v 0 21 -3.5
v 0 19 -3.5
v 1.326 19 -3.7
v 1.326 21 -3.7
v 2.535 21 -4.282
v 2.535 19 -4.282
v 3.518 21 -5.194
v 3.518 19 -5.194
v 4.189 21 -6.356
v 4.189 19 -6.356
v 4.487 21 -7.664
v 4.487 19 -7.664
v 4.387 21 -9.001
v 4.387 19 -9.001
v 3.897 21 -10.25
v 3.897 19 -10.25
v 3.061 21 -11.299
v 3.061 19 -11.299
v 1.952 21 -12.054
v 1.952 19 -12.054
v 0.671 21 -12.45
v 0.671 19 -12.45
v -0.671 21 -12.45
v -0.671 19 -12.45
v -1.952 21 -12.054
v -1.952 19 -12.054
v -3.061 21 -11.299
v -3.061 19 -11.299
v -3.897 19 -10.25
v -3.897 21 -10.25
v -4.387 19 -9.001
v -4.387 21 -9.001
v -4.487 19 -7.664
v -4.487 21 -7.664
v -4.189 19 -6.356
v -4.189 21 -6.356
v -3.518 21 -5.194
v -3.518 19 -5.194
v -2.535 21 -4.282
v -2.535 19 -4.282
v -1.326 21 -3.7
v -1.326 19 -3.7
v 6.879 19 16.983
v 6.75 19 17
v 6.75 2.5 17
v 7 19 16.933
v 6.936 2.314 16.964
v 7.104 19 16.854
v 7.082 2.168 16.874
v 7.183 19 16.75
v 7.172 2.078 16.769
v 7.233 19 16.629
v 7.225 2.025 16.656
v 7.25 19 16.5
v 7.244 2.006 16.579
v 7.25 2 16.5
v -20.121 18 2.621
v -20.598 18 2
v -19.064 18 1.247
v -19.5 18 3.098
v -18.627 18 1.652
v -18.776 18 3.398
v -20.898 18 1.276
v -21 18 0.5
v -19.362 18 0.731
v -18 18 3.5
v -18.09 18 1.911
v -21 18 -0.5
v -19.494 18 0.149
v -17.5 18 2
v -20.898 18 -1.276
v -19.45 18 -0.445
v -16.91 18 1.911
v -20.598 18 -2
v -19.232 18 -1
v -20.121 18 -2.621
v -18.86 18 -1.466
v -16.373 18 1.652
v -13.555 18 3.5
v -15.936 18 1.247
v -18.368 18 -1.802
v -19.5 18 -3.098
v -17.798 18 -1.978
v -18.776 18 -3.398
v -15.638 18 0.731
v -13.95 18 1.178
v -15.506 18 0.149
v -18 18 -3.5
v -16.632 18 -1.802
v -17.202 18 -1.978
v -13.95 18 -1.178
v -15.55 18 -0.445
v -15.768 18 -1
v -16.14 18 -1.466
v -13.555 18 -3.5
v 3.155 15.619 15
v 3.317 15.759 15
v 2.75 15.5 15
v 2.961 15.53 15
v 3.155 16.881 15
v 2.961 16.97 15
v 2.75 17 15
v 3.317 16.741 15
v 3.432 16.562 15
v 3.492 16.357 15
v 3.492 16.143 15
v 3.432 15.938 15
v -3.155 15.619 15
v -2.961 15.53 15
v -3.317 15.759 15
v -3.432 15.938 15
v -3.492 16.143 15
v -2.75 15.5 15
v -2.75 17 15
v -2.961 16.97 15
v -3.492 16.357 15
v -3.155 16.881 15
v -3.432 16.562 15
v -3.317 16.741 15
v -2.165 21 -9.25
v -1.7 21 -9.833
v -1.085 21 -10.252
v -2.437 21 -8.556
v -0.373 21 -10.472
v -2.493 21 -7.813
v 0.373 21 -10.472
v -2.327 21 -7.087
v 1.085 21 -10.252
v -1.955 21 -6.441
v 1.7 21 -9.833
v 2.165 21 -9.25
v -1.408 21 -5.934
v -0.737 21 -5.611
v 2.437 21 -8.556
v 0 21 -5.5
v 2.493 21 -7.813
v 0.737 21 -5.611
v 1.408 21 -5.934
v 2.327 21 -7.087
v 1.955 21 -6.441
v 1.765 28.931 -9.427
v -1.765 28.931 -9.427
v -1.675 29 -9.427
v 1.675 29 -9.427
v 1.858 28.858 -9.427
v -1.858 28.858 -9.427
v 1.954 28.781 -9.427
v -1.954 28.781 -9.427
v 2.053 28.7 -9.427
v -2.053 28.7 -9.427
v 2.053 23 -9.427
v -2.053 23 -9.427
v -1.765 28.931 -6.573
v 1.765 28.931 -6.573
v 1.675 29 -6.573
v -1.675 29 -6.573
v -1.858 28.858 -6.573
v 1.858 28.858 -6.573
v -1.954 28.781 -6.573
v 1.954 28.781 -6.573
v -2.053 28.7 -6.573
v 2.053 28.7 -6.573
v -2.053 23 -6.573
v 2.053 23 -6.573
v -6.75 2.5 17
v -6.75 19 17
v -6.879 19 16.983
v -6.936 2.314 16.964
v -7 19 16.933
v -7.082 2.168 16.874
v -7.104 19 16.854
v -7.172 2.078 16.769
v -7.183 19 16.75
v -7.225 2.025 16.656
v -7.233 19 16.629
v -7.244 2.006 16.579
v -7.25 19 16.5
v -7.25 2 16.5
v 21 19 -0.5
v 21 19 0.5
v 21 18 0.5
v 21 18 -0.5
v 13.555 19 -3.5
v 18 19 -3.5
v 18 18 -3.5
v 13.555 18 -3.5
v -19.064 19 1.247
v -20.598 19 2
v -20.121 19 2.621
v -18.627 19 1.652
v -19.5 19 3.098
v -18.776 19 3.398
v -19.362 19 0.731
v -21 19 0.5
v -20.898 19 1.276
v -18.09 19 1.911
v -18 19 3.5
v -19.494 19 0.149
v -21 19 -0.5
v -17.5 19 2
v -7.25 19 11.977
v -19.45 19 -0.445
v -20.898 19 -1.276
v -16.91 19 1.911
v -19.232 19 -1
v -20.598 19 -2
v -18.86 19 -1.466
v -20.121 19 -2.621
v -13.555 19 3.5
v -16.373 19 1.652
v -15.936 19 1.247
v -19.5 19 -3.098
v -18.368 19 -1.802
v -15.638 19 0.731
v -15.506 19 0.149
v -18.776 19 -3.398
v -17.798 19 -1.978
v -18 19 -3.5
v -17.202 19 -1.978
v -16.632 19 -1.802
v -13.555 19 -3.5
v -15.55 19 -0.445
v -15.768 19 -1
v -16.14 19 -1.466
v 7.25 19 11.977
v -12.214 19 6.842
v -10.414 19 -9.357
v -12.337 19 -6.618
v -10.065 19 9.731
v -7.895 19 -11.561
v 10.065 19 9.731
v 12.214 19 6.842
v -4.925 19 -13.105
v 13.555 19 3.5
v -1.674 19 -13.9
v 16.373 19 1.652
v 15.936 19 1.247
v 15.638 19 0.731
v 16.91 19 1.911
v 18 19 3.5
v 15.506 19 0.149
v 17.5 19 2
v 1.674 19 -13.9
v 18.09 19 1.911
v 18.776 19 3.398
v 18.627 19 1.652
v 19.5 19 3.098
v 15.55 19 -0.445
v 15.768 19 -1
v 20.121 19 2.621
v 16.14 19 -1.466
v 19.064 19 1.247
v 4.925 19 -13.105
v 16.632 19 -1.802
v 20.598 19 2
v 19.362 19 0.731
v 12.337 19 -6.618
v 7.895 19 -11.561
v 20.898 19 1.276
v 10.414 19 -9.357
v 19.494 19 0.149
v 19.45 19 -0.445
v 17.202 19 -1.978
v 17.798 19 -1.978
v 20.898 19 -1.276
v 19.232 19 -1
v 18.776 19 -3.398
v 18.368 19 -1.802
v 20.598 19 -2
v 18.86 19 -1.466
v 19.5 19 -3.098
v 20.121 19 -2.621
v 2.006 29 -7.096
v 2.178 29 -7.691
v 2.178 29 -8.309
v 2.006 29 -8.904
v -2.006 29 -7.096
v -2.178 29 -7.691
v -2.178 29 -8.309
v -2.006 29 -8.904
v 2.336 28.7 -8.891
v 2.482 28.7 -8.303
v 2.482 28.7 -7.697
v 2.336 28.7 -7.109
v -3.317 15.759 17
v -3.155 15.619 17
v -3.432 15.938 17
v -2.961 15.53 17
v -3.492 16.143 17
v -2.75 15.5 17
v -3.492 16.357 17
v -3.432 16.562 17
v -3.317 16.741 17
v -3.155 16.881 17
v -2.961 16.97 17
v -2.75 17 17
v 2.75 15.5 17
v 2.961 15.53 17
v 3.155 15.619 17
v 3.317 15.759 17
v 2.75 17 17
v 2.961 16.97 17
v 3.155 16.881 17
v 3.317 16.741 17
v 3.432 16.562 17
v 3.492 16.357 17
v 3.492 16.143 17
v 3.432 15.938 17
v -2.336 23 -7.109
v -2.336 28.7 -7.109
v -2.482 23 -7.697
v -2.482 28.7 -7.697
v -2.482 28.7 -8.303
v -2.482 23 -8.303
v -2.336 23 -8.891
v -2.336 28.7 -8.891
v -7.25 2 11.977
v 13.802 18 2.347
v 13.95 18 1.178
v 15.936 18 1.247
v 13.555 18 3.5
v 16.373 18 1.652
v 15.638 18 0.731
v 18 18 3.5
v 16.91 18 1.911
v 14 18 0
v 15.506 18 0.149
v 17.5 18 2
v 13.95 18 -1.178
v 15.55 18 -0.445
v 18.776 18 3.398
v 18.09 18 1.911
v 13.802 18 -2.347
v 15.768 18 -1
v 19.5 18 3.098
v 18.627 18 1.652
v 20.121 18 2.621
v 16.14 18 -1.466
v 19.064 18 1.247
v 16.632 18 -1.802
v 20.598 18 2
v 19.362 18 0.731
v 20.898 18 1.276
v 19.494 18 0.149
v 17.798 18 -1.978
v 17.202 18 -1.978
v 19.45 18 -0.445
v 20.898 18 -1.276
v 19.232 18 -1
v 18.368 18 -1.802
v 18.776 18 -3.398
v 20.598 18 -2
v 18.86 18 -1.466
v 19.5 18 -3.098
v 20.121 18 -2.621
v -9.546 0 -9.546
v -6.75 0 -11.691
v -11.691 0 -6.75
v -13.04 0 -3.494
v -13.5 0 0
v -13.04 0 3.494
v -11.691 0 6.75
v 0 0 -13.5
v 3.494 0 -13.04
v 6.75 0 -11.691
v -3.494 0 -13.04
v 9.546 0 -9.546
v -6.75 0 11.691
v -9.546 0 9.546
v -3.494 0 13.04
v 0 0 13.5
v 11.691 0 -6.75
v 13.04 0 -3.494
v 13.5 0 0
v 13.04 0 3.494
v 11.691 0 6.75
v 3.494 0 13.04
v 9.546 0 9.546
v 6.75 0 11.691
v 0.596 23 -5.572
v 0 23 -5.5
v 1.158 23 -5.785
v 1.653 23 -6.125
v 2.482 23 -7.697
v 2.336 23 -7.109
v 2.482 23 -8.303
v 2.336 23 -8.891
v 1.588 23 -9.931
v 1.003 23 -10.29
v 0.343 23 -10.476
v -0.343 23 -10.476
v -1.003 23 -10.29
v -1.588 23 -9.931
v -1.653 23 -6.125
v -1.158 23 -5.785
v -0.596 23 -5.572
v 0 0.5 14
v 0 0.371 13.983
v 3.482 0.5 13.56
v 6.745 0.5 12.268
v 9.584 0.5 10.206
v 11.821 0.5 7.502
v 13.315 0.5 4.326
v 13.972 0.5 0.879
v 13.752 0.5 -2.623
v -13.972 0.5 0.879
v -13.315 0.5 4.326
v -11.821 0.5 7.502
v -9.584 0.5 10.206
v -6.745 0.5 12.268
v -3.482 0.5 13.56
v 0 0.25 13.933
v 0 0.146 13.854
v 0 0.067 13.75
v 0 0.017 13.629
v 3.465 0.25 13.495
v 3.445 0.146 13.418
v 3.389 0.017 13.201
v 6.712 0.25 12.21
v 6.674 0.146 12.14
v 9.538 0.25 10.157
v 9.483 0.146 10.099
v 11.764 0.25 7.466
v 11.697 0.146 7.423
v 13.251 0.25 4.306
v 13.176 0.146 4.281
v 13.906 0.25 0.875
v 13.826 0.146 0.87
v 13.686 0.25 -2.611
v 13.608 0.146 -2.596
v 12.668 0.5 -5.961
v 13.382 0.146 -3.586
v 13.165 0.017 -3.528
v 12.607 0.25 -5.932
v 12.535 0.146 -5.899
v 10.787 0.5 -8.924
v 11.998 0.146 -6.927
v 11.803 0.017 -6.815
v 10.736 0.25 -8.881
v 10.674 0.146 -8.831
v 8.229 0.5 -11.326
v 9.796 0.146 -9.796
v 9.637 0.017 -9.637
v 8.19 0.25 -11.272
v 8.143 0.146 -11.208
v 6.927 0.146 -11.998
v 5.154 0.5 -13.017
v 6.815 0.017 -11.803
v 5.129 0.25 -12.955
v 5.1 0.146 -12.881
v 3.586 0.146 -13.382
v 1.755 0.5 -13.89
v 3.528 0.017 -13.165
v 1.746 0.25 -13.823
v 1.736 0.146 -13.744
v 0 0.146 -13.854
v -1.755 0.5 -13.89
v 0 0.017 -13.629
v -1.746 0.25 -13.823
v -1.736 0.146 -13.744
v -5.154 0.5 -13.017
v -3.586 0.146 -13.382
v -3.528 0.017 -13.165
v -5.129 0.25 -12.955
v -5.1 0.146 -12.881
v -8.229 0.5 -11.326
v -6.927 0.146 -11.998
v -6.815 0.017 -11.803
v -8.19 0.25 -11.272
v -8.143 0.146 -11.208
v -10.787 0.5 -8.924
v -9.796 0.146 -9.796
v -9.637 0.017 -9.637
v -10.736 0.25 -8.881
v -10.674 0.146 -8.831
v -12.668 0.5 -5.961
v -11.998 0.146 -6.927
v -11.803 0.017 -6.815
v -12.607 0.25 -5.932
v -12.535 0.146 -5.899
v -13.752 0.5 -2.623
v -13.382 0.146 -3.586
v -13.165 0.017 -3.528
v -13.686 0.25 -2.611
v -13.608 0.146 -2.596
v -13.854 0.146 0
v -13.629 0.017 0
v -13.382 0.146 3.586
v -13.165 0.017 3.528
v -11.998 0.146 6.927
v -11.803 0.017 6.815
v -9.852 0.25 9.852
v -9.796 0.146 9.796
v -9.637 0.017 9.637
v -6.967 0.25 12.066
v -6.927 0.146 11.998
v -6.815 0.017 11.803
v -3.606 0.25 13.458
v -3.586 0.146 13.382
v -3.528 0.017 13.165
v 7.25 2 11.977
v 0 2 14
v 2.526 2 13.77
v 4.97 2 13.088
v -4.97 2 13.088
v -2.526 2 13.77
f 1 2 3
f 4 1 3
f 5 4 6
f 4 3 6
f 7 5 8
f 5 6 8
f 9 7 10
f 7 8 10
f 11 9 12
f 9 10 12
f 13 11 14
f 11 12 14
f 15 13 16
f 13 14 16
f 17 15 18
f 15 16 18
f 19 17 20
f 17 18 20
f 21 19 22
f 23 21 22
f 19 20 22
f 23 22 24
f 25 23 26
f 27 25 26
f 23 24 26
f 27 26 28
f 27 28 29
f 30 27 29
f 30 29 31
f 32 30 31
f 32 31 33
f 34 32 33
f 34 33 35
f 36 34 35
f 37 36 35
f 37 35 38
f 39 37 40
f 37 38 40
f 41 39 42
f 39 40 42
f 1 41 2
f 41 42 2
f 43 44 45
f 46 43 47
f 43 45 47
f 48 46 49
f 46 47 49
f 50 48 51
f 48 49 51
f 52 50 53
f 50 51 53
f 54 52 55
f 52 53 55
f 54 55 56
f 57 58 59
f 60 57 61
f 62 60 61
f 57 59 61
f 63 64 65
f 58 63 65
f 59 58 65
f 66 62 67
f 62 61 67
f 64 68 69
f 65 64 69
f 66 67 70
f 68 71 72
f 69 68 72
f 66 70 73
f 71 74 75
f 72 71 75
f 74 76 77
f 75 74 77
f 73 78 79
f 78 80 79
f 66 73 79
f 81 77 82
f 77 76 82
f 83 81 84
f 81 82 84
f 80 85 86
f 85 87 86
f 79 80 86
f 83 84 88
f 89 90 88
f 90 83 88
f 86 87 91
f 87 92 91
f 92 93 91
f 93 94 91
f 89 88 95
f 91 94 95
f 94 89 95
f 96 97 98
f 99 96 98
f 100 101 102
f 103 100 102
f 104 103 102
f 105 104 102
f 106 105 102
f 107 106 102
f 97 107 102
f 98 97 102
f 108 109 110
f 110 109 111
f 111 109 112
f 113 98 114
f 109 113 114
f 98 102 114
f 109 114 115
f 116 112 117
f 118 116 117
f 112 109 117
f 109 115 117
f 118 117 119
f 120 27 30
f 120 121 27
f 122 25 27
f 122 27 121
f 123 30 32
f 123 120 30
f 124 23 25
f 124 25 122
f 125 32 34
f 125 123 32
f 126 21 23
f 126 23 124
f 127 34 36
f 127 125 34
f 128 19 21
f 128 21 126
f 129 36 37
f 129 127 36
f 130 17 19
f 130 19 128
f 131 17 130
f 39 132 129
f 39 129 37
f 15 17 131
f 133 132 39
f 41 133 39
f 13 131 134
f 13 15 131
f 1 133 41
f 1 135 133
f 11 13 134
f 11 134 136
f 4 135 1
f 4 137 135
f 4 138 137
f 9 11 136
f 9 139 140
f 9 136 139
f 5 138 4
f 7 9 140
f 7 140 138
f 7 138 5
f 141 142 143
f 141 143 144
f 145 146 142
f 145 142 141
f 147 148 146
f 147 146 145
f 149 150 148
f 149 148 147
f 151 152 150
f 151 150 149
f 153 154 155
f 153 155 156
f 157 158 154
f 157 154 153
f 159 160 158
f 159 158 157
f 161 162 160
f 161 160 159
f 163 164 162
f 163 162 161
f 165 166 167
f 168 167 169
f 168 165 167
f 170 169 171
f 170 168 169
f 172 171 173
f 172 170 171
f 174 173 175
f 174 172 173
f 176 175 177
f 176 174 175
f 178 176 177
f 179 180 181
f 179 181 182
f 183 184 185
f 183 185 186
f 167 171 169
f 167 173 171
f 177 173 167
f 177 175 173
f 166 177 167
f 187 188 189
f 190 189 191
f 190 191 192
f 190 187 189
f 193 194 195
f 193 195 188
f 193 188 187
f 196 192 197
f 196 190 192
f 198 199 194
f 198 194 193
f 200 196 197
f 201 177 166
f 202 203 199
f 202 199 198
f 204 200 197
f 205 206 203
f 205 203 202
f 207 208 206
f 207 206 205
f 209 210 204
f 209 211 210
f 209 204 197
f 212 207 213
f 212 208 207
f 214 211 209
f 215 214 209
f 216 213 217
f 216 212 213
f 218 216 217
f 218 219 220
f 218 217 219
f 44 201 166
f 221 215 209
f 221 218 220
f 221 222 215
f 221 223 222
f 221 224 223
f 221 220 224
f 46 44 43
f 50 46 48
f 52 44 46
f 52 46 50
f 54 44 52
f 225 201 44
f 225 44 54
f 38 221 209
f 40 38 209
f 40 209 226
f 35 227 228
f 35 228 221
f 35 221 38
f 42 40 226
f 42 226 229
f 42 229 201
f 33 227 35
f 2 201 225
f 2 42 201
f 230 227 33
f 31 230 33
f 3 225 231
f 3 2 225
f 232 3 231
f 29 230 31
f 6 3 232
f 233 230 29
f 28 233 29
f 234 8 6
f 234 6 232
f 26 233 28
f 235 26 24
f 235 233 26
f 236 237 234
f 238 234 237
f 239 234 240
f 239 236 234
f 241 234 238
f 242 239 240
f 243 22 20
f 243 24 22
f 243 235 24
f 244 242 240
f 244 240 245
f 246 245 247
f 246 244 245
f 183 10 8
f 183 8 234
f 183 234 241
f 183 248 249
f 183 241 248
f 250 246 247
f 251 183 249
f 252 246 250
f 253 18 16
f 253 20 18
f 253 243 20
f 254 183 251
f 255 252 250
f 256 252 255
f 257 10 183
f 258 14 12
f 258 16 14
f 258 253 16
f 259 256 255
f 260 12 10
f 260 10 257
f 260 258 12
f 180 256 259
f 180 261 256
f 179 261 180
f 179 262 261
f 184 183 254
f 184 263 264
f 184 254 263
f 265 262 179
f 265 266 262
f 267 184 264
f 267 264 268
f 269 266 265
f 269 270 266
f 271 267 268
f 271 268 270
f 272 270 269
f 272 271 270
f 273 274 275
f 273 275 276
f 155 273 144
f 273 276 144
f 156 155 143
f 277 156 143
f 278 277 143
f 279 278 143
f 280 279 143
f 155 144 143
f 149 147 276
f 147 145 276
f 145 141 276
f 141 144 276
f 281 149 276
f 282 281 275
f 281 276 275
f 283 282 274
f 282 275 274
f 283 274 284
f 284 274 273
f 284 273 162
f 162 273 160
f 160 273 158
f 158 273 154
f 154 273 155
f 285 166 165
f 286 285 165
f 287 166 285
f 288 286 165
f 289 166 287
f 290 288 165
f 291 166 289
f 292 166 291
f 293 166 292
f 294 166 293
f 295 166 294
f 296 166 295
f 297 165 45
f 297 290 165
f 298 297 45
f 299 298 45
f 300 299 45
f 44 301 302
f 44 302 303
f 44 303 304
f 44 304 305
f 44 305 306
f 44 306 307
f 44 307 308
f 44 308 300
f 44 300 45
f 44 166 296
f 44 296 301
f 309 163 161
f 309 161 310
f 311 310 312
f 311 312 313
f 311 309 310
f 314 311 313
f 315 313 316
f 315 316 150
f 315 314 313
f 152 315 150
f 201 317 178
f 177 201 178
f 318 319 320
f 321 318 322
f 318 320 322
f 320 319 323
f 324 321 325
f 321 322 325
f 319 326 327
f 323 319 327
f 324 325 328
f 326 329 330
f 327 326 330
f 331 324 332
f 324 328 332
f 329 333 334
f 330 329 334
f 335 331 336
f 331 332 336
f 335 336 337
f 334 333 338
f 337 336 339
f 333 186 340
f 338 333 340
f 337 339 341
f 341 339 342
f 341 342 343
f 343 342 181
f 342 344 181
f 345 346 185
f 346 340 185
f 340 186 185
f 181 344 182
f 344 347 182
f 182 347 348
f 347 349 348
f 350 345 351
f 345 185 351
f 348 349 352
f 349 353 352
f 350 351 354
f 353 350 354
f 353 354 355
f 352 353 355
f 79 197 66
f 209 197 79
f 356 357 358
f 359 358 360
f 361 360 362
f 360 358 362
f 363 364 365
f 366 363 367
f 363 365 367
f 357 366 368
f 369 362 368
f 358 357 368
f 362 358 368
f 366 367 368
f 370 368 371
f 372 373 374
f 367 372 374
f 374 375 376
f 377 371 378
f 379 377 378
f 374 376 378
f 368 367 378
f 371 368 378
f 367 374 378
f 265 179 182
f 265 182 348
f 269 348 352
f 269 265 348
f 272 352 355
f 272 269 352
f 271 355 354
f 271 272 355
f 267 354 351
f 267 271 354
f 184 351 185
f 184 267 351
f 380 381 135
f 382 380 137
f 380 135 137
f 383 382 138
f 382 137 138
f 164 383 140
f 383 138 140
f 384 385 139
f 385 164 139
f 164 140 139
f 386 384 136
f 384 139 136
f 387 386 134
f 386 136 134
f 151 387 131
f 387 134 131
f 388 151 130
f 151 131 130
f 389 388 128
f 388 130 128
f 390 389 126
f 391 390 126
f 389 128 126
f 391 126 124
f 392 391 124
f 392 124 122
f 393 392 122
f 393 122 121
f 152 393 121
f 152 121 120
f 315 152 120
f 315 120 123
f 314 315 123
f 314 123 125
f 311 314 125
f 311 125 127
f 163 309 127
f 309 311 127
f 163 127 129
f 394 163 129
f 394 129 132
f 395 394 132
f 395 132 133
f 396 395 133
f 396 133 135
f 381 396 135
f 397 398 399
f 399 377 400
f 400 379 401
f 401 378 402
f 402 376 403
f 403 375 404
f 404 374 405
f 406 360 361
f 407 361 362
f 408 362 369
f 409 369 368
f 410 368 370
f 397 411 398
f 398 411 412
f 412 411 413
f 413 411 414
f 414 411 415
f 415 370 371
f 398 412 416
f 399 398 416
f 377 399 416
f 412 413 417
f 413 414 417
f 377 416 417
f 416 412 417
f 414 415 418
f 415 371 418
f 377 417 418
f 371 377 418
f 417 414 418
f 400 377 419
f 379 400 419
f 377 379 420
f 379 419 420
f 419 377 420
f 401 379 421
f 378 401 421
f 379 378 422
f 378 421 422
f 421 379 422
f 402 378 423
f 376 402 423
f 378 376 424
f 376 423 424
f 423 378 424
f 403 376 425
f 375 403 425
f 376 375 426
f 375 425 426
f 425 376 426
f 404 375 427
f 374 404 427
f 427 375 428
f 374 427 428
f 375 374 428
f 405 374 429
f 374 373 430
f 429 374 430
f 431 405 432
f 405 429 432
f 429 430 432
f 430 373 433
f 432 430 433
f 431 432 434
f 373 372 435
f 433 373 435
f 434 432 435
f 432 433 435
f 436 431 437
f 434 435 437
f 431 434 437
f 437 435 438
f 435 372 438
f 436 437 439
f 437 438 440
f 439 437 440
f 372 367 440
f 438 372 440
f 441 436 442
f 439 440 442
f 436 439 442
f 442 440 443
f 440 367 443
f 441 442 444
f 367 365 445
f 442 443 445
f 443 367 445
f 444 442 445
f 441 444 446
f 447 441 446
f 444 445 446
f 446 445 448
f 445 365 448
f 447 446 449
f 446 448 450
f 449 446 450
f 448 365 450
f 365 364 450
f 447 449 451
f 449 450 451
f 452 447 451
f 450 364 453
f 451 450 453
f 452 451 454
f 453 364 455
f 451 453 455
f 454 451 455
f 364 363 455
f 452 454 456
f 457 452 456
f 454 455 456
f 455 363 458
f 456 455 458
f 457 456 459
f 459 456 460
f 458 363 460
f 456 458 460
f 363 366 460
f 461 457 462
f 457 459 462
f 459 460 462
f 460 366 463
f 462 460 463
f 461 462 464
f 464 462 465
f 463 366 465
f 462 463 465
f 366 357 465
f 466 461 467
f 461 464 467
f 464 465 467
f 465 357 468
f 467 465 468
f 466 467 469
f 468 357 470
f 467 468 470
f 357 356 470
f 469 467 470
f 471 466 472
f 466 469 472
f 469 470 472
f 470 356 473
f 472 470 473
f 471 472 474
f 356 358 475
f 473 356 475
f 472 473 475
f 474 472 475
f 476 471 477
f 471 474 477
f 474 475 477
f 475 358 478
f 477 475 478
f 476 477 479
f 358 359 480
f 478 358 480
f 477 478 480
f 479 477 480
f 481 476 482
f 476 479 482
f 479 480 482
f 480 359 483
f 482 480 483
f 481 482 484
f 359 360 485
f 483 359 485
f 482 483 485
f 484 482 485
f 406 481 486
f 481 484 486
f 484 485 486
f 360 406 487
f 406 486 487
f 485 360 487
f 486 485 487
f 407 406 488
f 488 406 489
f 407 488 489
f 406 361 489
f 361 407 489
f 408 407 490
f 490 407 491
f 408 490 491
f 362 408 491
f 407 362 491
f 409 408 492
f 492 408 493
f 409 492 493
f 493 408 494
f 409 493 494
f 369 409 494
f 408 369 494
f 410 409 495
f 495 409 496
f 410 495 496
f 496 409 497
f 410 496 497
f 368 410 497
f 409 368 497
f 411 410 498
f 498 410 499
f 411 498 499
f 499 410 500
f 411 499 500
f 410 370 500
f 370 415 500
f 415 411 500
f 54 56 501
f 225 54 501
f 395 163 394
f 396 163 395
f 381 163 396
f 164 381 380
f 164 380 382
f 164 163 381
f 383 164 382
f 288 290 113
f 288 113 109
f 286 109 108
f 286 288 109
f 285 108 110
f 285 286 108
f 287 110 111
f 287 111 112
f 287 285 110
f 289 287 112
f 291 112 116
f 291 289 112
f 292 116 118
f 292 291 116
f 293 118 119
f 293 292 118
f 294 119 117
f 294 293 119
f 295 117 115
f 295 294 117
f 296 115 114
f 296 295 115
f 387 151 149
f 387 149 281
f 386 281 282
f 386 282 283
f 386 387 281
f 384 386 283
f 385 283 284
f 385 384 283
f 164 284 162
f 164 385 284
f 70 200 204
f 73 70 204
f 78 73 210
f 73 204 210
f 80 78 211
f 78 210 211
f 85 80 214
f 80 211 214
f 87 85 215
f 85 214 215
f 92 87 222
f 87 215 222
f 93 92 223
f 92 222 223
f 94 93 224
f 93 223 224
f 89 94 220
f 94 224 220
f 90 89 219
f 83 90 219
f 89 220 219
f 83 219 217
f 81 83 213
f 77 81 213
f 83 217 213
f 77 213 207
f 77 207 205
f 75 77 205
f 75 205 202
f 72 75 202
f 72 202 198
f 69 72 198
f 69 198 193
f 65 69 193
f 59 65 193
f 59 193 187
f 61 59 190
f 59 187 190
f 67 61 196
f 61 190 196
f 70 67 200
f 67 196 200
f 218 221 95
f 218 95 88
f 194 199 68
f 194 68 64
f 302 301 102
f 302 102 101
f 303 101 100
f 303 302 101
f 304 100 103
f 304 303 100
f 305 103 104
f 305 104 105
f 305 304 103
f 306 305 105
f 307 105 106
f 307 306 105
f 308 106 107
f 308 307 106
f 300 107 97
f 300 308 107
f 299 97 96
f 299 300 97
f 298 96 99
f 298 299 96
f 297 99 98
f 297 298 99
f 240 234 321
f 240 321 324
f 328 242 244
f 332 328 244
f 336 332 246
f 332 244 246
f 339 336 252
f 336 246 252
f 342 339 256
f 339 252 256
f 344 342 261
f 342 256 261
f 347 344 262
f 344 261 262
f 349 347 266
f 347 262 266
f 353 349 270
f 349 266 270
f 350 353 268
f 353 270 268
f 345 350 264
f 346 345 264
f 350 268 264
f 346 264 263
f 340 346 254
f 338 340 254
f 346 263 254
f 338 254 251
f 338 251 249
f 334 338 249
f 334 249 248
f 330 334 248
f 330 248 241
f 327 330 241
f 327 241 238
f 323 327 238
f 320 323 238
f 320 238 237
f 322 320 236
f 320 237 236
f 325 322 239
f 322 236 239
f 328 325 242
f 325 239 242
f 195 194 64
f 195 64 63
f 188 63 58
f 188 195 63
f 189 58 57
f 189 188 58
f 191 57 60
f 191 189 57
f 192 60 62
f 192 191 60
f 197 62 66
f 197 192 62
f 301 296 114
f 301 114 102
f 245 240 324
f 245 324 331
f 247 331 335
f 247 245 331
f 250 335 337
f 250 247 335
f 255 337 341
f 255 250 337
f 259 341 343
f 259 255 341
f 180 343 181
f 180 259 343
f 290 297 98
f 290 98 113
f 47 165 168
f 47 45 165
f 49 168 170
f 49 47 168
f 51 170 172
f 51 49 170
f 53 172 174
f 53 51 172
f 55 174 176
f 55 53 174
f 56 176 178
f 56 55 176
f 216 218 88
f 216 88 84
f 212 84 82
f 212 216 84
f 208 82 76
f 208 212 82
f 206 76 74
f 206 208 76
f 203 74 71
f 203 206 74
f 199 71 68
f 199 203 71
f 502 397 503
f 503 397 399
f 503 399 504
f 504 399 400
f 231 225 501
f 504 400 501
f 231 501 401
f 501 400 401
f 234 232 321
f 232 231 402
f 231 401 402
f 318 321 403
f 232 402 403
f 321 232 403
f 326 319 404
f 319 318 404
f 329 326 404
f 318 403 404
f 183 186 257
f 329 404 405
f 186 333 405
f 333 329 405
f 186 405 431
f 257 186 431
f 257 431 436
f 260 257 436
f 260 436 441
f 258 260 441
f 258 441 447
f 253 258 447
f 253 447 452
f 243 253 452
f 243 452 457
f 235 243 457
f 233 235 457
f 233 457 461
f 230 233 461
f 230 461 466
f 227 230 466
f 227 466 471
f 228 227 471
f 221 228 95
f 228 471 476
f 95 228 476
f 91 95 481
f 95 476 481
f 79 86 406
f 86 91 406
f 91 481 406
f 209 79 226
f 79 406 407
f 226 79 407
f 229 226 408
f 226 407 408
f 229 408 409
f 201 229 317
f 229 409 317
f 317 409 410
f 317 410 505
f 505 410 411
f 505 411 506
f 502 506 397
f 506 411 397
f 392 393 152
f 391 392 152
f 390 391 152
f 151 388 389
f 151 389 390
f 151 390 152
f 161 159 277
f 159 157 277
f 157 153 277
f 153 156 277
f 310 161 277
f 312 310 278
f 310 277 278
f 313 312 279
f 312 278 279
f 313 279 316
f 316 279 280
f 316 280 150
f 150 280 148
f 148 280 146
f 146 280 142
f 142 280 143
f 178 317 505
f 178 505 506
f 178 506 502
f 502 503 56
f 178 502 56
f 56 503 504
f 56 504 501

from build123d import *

# Parameters (mm, degrees)
SKETCH_1_R          = 14
EXTRUDE_1_DEPTH     = 19
SKETCH_2_R          = 2
EXTRUDE_2_DEPTH     = 1
EXTRUDE_3_DEPTH     = 17
SKETCH_6_R          = 4.5
EXTRUDE_4_DEPTH     = 2
SKETCH_7_R          = 2.5
EXTRUDE_6_DEPTH     = 2
EXTRUDE_8_DEPTH     = 6
CUT_EXTRUDE_1_DEPTH = 2
CHAMFER_4_SIZE      = 0.3
FILLET_3_R          = 0.5
FILLET_4_R          = 0.5


with BuildPart() as part:
    # Эскиз1 → Бобышка-Вытянуть1 (new body)
    with BuildSketch(Plane(origin=(0, 0, 0), x_dir=(1, 0, 0), z_dir=(0, 1, 0))):
        with Locations(Location((0, 0, 0), (0, 0, 270))):
            Circle(SKETCH_1_R)
    extrude(amount=EXTRUDE_1_DEPTH)

    # Эскиз2 → Бобышка-Вытянуть2 (add)
    with BuildSketch(Plane(origin=(0, 19, 0), x_dir=(1, 0, 0), z_dir=(0, 1, 0))):
        with BuildLine():
            ThreePointArc((14, 0), (13.888415748, -1.764060095), (13.555441712, -3.5))
            Line((13.555441712, -3.5), (18, -3.5))
            ThreePointArc((18, -3.5), (20.121320344, -2.621320344), (21, -0.5))
            Line((21, -0.5), (21, 0.5))
            ThreePointArc((21, 0.5), (20.121320344, 2.621320344), (18, 3.5))
            Line((18, 3.5), (13.555441712, 3.5))
            ThreePointArc((13.555441712, 3.5), (13.888415748, 1.764060095), (14, 0))
        make_face()
        with Locations(Location((17.5, 0, 0), (0, 0, 270))):
            Circle(SKETCH_2_R, mode=Mode.SUBTRACT)
        with BuildLine():
            ThreePointArc((-21, -0.5), (-20.121320344, -2.621320344), (-18, -3.5))
            Line((-18, -3.5), (-13.555441712, -3.5))
            ThreePointArc((-13.555441712, -3.5), (-14, 0), (-13.555441712, 3.5))
            Line((-13.555441712, 3.5), (-18, 3.5))
            ThreePointArc((-18, 3.5), (-20.121320344, 2.621320344), (-21, 0.5))
            Line((-21, 0.5), (-21, -0.5))
        make_face()
        with Locations(Location((-17.5, 0, 0), (0, 0, 270))):
            Circle(SKETCH_2_R, mode=Mode.SUBTRACT)
    extrude(amount=-EXTRUDE_2_DEPTH)

    # Эскиз5 → Бобышка-Вытянуть3 (add)
    with BuildSketch(Plane(origin=(0, 19, 0), x_dir=(1, 0, 0), z_dir=(0, 1, 0))):
        with BuildLine():
            Line((-7.25, -17), (7.25, -17))
            Line((7.25, -17), (7.25, -11.976539567))
            ThreePointArc((7.25, -11.976539567), (0, -14), (-7.25, -11.976539567))
            Line((-7.25, -11.976539567), (-7.25, -17))
        make_face()
    extrude(amount=-EXTRUDE_3_DEPTH)

    # Эскиз6 → Бобышка-Вытянуть4 (add)
    with BuildSketch(Plane(origin=(0, 19, 0), x_dir=(1, 0, 0), z_dir=(0, 1, 0))):
        with Locations(Location((0, 8, 0), (0, 0, 270))):
            Circle(SKETCH_6_R)
    extrude(amount=EXTRUDE_4_DEPTH)

    # Эскиз7 → Бобышка-Вытянуть6 (add)
    with BuildSketch(Plane(origin=(0, 21, 0), x_dir=(1, 0, 0), z_dir=(0, 1, 0))):
        with Locations(Location((0, 8, 0), (0, 0, 270))):
            Circle(SKETCH_7_R)
    extrude(amount=EXTRUDE_6_DEPTH)

    # Эскиз9 → Бобышка-Вытянуть8 (add)
    with BuildSketch(Plane(origin=(0, 23, 0), x_dir=(1, 0, 0), z_dir=(0, 1, 0))):
        with BuildLine():
            Line((-2.053041545, 9.426541417), (2.053041545, 9.426541417))
            ThreePointArc((2.053041545, 9.426541417), (2.5, 8), (2.053041545, 6.573458583))
            Line((2.053041545, 6.573458583), (-2.053041545, 6.573458583))
            ThreePointArc((-2.053041545, 6.573458583), (-2.5, 8), (-2.053041545, 9.426541417))
        make_face()
    extrude(amount=EXTRUDE_8_DEPTH)

    # Эскиз11 → Вырез-Вытянуть1 (cut)
    with BuildSketch(Plane.XY.offset(17)):
        with BuildLine():
            Line((-2.75, 17), (2.75, 17))
            ThreePointArc((2.75, 17), (3.5, 16.25), (2.75, 15.5))
            Line((2.75, 15.5), (-2.75, 15.5))
            ThreePointArc((-2.75, 15.5), (-3.5, 16.25), (-2.75, 17))
        make_face()
    extrude(amount=-CUT_EXTRUDE_1_DEPTH, mode=Mode.SUBTRACT)

    # Фаска4
    chamfer_4_edges = [part.edges().sort_by_distance(p)[0] for p in [
        (2.5, 29, -8),
        (-2.5, 29, -8),
    ]]
    chamfer(chamfer_4_edges, length=CHAMFER_4_SIZE)

    # Скругление3
    fillet_3_edges = [part.edges().sort_by_distance(p)[0] for p in [
        (0, 2, 17),
        (7.25, 10.5, 17),
        (-7.25, 10.5, 17),
    ]]
    fillet(fillet_3_edges, radius=FILLET_3_R)

    # Скругление4
    fillet_4_edges = [part.edges().sort_by_distance(p)[0] for p in [
        (0, 0, -14),
    ]]
    fillet(fillet_4_edges, radius=FILLET_4_R)


solid = part.part
